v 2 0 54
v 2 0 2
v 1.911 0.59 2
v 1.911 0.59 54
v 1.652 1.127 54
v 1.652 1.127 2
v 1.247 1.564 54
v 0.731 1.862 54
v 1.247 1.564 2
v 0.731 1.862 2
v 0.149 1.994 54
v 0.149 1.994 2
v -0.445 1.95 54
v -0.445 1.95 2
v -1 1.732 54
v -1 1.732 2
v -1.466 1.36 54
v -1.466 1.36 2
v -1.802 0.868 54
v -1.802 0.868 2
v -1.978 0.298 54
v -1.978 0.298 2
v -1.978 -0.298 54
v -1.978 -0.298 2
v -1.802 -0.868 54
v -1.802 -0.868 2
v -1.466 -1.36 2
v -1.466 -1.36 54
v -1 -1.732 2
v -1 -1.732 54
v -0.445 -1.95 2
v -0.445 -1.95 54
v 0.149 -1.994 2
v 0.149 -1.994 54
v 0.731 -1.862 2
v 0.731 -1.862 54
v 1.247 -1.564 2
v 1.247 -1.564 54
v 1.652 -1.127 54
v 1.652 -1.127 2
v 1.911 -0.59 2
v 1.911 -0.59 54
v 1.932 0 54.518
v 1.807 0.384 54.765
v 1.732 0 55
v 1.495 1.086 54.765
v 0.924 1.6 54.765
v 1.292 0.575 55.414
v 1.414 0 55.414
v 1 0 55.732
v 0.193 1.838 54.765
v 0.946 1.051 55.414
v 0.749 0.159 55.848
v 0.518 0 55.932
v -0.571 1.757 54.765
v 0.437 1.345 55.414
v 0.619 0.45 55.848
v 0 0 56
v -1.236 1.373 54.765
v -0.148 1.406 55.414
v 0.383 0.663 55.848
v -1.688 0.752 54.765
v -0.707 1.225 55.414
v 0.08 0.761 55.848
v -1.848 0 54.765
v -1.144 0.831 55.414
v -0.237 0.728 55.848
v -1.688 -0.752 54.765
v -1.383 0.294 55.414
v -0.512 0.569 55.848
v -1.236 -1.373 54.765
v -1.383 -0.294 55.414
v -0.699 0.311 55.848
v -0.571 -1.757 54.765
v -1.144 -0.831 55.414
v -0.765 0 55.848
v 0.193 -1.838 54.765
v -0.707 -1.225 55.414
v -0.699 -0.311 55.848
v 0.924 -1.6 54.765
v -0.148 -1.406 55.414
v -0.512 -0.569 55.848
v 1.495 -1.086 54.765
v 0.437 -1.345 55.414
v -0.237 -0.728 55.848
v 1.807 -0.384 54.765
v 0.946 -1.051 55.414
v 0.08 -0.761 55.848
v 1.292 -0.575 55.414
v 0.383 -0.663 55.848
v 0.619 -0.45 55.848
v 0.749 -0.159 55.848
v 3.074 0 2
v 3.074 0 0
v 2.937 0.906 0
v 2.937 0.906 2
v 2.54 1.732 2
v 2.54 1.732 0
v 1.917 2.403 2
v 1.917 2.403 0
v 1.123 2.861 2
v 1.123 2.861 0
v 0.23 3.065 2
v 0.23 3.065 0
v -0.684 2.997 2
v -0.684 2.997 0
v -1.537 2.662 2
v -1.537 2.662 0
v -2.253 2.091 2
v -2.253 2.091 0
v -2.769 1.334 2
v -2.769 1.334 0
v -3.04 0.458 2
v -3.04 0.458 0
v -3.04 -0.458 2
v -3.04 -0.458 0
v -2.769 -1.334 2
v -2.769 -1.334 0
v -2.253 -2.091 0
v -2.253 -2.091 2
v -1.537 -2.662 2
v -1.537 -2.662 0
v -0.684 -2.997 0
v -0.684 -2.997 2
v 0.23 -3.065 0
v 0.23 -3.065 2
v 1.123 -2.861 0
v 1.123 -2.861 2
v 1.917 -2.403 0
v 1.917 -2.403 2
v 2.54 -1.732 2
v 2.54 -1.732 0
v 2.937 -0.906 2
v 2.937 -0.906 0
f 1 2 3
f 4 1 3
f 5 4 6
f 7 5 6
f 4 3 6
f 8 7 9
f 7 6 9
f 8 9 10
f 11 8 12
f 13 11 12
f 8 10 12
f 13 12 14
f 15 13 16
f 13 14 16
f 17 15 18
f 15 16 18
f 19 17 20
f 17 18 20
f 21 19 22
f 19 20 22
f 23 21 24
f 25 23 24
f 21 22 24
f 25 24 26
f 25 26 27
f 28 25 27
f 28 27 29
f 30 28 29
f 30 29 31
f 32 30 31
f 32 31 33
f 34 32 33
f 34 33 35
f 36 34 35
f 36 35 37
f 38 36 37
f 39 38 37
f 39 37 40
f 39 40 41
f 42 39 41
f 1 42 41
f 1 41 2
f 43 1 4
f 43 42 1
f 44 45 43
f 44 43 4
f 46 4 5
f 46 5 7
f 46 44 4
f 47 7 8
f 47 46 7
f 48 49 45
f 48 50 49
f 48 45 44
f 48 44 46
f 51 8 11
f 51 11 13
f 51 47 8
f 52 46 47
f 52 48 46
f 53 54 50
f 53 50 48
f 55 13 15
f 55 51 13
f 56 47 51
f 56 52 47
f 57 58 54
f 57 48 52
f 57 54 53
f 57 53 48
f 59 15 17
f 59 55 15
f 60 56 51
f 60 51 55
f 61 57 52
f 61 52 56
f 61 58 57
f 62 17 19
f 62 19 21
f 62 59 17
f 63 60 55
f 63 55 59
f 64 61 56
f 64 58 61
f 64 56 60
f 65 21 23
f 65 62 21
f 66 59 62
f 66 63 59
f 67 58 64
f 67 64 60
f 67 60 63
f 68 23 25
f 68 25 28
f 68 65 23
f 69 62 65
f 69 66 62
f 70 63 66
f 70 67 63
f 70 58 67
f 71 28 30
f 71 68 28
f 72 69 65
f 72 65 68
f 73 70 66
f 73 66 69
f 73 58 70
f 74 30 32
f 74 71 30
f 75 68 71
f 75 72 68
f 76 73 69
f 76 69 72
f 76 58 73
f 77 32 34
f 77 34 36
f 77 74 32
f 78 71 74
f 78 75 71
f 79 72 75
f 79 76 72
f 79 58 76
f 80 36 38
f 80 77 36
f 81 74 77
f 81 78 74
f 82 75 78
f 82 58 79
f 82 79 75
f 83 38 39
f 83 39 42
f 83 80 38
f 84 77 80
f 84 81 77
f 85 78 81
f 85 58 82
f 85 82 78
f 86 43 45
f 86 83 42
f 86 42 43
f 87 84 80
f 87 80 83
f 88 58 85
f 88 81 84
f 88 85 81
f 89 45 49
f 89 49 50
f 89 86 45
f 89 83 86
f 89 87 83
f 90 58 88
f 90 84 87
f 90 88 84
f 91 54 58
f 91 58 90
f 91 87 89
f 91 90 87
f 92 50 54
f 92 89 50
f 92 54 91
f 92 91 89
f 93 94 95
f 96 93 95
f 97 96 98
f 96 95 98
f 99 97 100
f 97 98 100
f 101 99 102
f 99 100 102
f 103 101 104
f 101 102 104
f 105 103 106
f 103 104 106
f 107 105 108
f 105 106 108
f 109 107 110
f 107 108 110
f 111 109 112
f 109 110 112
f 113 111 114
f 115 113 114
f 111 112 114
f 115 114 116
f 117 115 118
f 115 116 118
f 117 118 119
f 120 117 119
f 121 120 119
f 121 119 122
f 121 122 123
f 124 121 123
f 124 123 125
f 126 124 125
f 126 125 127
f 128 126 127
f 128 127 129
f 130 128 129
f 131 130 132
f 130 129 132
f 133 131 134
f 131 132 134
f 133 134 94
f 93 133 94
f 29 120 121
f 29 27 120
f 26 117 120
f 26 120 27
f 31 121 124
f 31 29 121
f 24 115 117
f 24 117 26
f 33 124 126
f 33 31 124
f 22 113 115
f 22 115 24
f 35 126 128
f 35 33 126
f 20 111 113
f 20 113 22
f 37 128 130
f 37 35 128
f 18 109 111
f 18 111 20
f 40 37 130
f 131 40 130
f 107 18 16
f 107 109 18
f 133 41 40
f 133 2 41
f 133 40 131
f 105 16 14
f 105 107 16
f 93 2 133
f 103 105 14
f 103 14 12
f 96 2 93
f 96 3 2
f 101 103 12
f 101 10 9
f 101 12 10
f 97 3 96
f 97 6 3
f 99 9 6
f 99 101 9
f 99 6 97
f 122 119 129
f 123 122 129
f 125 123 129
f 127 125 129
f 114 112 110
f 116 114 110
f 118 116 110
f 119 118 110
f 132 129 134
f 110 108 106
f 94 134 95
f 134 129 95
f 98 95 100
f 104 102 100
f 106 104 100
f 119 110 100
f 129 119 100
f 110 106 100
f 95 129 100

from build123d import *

# Parameters (mm, degrees)
F0_R      = 2
F1_DEPTH  = 56
F0_R_2    = 3.0739118257
F1_FACE_R = 2
F2_DEPTH  = 2
F3_R      = 2


with BuildPart() as f1:
    # F0 (on Top) → F1 (new body)
    with BuildSketch(Plane.XY):
        Circle(F0_R)
    extrude(amount=F1_DEPTH)

    # F0 (on Top) + F1_face (on face) → F2 (join)
    with BuildSketch(Plane.XY):
        Circle(F0_R_2)
        Circle(F0_R, mode=Mode.SUBTRACT)
    with BuildSketch(Plane(origin=(0, 0, 0), x_dir=(1, 0, 0), z_dir=(0, 0, -1))):
        Circle(F1_FACE_R)
    extrude(amount=F2_DEPTH, dir=(0, 0, 1))

    # F3
    f3_edges = [f1.edges().sort_by_distance(p)[0] for p in [
        (-2, 0, 56),
    ]]
    fillet(f3_edges, radius=F3_R)


solid = f1.part
